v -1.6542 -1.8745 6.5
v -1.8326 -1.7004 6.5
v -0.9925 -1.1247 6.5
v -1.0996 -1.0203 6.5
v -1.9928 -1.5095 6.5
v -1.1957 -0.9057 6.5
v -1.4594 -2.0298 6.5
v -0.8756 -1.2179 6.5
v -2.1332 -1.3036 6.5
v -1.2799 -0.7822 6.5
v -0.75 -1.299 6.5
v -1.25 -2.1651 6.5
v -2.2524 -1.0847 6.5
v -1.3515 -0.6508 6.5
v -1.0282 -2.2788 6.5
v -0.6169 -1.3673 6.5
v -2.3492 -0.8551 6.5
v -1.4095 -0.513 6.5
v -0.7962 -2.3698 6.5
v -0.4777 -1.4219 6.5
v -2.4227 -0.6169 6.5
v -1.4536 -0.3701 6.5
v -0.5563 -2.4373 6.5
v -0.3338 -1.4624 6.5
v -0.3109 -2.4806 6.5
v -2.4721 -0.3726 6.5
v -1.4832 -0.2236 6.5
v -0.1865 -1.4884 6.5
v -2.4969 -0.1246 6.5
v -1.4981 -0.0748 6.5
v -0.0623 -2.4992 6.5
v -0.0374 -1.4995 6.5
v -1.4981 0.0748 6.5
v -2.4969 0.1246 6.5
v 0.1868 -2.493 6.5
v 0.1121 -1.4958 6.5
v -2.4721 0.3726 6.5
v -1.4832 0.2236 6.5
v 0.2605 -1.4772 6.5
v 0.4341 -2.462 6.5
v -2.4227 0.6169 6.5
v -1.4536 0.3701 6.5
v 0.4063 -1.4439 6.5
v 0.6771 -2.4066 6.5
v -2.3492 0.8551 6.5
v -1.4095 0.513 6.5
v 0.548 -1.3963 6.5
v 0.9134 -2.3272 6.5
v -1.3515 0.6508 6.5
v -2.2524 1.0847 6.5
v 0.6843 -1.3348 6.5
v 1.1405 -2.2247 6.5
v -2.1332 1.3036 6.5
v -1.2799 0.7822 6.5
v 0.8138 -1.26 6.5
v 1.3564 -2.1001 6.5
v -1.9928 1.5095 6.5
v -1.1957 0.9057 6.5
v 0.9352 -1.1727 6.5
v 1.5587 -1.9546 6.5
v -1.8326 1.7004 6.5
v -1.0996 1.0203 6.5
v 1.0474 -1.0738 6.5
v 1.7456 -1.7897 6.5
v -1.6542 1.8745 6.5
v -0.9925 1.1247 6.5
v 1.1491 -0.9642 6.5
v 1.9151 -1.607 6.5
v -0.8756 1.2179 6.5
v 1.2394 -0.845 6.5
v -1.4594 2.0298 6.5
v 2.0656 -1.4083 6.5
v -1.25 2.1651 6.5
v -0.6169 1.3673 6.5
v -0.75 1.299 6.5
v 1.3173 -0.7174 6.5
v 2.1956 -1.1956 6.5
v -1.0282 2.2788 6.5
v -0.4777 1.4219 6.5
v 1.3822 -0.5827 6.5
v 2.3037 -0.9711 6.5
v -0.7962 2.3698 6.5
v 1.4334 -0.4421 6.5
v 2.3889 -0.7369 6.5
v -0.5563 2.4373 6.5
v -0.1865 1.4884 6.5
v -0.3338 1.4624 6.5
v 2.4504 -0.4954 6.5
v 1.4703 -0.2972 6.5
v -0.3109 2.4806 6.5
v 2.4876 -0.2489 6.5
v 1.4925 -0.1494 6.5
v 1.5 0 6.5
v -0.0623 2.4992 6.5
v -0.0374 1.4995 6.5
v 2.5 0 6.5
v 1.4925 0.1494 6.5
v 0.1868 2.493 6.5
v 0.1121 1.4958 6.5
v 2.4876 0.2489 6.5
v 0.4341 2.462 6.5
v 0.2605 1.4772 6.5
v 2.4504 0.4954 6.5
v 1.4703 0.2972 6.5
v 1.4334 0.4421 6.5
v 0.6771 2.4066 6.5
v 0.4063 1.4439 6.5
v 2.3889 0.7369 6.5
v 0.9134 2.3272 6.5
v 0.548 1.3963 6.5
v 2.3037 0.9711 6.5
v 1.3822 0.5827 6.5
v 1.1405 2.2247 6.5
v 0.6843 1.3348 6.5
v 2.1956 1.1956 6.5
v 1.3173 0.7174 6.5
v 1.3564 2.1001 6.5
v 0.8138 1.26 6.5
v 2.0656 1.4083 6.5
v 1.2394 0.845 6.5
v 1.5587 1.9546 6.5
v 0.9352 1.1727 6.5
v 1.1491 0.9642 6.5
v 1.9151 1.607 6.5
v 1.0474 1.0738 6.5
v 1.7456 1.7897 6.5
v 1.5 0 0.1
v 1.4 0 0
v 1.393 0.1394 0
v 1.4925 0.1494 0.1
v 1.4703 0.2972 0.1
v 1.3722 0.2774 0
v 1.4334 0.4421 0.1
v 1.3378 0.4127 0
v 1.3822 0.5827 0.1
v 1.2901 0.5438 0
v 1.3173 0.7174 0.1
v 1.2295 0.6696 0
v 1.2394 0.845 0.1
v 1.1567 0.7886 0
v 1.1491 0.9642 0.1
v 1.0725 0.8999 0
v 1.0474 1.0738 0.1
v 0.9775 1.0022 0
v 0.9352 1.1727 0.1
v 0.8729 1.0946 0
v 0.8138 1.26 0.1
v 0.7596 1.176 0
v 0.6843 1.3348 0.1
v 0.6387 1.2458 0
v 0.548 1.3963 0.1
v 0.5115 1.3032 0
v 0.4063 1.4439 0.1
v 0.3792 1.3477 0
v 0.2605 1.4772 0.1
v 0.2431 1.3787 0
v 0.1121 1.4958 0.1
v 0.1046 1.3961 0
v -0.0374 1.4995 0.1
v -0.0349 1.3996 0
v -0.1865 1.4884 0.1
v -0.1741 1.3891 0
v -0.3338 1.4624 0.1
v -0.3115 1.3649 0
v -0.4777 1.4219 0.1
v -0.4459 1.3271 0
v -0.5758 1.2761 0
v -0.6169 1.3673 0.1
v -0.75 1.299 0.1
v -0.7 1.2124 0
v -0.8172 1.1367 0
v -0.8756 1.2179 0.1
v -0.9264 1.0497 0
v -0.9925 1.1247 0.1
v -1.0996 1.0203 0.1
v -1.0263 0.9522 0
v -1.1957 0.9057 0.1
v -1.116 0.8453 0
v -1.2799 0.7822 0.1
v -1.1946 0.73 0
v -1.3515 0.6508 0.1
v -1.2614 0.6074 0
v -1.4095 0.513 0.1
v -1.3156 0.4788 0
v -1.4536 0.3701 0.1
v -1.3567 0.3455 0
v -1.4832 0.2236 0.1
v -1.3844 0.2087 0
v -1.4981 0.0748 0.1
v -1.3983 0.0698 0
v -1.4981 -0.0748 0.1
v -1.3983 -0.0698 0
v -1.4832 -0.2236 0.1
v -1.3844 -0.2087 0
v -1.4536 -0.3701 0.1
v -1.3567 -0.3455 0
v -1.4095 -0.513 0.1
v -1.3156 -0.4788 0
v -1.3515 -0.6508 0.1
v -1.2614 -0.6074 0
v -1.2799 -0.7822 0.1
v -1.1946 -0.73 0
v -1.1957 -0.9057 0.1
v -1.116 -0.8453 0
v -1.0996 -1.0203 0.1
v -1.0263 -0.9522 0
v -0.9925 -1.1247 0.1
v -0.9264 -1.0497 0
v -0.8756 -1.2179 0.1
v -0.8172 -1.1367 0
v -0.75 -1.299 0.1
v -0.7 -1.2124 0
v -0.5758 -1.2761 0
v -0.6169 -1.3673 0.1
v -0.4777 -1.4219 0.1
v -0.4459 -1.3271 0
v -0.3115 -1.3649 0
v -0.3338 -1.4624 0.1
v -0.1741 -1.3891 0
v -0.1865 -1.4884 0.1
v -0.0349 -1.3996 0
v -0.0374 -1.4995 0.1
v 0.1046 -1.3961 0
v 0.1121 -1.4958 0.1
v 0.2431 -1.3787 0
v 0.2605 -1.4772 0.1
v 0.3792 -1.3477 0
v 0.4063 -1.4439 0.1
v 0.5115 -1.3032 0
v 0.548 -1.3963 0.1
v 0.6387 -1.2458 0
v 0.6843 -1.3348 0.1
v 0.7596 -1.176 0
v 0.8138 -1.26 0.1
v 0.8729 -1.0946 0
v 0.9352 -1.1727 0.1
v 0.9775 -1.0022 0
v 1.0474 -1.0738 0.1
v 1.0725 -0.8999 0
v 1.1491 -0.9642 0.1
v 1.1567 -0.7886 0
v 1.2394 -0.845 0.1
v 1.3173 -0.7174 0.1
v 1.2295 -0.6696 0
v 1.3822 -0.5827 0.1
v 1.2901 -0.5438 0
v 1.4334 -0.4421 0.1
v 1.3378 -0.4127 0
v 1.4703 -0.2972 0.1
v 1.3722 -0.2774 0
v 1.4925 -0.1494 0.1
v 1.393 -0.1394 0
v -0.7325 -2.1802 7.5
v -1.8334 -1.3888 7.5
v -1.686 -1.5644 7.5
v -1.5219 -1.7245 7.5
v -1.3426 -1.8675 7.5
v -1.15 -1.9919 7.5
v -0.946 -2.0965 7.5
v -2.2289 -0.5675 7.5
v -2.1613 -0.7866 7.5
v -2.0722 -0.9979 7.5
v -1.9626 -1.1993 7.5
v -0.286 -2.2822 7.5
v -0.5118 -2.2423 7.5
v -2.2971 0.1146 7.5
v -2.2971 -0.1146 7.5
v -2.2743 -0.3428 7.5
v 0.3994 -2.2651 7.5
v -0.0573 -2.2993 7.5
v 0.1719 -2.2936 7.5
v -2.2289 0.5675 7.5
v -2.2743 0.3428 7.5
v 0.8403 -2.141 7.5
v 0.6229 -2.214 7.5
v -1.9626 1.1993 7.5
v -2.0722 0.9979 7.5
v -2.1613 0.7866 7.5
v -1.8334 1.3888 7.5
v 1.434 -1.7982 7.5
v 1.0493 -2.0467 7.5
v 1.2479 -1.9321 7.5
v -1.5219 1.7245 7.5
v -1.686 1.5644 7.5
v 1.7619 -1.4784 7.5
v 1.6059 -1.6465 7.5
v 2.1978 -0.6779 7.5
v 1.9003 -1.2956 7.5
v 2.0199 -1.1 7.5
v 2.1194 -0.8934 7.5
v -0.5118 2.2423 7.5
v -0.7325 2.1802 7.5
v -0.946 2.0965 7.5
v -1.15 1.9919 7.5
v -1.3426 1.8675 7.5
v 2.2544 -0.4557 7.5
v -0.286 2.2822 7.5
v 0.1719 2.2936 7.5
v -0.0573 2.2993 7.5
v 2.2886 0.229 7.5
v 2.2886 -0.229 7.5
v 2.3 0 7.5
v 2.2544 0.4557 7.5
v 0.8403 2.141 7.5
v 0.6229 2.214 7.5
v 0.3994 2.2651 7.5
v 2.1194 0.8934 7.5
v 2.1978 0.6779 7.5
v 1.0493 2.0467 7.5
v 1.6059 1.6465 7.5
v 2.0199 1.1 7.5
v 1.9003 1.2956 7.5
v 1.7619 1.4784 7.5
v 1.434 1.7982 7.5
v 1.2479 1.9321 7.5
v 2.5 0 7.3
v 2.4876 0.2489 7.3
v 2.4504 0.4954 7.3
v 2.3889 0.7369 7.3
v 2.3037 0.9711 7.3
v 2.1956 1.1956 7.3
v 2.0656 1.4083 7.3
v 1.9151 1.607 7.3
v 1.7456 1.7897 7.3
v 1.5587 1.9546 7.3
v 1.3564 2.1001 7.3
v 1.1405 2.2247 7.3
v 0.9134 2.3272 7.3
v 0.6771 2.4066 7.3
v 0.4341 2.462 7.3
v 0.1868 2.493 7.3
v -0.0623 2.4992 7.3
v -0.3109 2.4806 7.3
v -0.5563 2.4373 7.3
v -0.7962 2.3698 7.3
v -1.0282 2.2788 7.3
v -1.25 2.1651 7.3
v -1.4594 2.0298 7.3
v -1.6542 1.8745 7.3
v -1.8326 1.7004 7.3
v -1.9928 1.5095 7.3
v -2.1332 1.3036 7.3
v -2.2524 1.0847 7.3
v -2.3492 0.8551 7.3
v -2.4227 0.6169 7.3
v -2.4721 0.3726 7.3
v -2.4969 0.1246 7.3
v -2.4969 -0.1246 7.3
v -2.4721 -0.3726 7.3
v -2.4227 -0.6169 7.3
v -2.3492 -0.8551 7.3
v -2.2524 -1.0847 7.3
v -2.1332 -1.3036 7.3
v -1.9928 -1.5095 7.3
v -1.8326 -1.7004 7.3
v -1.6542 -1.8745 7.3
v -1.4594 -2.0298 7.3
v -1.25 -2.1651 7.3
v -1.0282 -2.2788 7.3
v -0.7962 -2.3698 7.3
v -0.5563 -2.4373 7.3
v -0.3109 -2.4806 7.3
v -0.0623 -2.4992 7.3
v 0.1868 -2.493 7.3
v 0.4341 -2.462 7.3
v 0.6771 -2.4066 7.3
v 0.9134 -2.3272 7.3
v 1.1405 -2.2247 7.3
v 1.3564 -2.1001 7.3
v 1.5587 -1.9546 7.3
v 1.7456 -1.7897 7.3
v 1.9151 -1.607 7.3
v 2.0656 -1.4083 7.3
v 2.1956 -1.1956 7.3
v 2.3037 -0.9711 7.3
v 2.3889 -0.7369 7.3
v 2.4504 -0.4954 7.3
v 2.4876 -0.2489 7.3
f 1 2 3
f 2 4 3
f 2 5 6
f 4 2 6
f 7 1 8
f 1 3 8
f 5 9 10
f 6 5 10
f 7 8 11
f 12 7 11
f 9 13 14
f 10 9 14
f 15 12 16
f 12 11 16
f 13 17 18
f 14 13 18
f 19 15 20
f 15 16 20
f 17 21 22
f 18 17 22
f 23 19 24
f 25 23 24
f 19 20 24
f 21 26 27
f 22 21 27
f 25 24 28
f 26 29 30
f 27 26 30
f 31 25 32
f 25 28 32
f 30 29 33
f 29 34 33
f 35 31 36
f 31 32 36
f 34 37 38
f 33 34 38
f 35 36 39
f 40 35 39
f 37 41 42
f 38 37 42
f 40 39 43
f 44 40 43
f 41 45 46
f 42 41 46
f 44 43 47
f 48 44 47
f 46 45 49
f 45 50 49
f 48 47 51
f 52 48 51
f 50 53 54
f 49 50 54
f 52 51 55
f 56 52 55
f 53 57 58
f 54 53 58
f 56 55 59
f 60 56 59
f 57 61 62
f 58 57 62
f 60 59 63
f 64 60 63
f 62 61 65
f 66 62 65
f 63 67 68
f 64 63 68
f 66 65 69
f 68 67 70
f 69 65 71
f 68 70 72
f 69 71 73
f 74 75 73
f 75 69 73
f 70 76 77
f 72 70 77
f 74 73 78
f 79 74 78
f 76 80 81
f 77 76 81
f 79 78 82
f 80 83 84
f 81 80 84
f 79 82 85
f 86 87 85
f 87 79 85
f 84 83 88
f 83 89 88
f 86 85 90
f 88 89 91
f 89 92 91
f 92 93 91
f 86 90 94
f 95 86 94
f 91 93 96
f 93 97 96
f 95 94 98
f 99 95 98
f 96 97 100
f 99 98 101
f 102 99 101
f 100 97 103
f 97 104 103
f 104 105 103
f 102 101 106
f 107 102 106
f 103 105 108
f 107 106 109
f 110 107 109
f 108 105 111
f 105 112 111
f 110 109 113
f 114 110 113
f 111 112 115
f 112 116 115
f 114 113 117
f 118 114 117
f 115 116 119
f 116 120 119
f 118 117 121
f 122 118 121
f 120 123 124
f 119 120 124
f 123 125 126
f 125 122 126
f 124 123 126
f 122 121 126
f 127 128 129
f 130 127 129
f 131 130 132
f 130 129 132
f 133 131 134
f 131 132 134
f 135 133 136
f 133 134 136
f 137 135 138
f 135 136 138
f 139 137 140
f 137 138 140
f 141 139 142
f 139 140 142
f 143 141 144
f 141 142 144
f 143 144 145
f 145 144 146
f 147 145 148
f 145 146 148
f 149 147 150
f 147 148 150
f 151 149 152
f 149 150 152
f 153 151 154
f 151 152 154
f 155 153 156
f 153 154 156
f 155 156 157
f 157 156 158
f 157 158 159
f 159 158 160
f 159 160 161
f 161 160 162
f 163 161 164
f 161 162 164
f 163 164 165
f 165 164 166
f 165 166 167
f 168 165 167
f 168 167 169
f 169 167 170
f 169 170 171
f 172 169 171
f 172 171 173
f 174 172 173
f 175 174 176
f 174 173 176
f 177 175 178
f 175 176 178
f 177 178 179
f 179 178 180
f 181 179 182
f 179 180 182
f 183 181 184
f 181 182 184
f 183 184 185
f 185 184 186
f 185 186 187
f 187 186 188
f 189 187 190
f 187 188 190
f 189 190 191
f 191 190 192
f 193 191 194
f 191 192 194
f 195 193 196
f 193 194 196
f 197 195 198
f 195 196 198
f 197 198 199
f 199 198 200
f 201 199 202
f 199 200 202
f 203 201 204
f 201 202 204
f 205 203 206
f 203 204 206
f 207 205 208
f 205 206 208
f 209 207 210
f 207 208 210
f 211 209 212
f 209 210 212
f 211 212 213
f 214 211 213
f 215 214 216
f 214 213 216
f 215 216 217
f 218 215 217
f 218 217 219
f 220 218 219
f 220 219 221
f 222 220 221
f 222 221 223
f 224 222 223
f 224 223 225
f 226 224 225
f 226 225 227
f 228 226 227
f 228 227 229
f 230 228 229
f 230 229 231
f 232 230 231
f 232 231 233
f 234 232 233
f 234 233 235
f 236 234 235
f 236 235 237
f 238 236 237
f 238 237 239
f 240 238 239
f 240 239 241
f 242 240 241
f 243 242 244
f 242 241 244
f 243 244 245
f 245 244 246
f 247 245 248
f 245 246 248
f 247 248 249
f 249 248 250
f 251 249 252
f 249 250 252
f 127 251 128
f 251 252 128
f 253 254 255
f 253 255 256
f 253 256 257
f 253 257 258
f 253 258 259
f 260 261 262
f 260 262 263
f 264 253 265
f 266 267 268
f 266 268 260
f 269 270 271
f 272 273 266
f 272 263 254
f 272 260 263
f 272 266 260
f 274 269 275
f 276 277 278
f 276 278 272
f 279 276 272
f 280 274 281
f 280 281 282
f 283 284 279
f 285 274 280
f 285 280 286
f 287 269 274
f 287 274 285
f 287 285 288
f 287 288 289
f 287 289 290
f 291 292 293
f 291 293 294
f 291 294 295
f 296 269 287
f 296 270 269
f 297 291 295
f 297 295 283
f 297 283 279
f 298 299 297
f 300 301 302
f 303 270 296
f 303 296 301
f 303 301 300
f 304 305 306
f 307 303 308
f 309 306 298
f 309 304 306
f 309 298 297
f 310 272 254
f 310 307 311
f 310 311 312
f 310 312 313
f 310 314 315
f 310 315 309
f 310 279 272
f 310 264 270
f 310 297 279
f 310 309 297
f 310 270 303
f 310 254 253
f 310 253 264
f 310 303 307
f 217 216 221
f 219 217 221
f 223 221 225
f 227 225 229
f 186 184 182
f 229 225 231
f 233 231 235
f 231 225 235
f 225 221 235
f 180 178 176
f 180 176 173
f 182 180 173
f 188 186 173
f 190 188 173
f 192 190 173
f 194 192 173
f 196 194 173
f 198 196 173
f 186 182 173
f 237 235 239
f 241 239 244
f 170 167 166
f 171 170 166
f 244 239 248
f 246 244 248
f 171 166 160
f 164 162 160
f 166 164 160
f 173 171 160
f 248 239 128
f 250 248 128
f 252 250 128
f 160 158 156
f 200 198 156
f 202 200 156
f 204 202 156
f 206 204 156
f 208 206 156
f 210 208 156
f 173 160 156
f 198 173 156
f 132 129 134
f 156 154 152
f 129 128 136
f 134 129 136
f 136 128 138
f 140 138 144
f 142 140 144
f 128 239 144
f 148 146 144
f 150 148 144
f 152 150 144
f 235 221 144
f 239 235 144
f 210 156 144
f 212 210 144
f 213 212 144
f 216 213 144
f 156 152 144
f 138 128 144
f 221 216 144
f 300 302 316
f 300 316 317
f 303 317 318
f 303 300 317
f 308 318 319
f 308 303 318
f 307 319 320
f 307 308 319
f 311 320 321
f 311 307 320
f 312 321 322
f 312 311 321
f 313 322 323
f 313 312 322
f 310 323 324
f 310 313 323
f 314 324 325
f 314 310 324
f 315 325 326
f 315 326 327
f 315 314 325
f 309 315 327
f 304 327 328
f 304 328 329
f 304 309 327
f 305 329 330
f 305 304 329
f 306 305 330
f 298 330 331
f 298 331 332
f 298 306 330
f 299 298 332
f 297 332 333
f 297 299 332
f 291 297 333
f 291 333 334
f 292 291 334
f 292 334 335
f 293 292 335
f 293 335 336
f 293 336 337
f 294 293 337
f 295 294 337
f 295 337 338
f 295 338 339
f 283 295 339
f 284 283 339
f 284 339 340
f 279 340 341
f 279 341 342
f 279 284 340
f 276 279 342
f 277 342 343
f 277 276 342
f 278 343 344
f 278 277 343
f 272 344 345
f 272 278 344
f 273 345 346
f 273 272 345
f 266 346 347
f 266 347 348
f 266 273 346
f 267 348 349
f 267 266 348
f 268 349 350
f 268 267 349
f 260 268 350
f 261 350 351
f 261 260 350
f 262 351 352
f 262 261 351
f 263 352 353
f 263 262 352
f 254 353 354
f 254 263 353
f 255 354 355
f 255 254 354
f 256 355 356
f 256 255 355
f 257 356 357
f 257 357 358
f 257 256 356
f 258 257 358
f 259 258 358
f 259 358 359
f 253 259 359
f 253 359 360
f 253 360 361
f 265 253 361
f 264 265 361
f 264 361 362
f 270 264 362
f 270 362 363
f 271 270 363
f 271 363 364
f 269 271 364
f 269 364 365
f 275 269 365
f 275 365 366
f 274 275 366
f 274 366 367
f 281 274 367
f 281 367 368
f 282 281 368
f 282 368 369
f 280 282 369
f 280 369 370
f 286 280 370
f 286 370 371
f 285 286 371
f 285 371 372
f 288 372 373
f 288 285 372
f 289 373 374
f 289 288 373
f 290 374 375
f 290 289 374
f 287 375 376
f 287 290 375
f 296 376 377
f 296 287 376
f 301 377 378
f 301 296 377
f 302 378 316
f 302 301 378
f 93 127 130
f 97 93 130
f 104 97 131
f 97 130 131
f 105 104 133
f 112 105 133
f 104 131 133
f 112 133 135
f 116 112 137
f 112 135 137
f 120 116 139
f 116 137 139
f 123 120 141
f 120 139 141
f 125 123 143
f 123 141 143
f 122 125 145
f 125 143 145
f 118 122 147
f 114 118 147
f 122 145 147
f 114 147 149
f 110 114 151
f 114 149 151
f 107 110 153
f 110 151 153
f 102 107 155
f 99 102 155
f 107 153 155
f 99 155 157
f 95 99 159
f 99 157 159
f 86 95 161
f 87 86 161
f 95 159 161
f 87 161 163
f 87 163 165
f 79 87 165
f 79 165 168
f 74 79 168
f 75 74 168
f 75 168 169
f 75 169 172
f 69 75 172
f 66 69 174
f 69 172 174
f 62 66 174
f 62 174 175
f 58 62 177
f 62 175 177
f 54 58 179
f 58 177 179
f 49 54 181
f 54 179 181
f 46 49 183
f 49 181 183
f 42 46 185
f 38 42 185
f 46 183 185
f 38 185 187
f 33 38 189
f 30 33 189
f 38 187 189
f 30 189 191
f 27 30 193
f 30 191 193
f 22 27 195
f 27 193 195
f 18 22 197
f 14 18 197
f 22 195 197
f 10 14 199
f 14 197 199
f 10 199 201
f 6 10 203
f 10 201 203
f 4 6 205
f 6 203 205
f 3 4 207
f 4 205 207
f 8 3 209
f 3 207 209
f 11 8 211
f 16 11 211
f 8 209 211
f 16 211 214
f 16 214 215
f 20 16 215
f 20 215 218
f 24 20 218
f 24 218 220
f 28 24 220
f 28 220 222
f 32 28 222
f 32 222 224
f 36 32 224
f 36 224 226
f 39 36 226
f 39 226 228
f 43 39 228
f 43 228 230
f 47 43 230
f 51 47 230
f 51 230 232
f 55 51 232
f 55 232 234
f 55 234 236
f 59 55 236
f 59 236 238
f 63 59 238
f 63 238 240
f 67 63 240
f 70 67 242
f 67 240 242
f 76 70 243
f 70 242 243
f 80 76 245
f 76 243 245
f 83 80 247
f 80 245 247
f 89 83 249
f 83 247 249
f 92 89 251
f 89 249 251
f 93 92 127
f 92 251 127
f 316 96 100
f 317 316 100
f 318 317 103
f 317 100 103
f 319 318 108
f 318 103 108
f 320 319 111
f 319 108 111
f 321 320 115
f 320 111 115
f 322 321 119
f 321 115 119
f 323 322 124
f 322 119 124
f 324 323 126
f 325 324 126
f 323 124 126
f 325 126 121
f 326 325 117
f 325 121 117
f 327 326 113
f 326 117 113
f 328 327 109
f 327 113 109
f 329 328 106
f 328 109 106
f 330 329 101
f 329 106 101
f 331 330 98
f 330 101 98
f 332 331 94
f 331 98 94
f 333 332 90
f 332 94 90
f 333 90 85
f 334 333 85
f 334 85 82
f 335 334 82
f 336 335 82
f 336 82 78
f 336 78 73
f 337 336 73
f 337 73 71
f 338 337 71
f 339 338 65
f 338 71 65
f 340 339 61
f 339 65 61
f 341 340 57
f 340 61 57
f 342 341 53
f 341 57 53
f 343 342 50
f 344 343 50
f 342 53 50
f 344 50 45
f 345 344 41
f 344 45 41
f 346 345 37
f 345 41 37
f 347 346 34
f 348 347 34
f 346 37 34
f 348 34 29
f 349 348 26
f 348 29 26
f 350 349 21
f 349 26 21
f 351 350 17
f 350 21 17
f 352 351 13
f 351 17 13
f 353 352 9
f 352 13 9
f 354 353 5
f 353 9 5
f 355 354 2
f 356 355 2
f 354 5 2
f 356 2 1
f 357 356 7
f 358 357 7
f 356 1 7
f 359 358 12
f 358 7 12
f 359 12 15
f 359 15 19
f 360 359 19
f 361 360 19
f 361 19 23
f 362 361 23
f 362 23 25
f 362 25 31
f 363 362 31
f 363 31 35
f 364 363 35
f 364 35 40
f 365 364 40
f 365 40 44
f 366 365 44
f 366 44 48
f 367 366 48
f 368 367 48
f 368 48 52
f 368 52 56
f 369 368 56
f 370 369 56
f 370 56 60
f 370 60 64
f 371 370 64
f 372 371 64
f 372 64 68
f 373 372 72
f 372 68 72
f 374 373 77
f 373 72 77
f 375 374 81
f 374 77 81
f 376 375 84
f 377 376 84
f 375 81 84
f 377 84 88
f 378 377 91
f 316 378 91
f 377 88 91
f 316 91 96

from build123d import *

# Parameters (mm, degrees)
SKETCH1_R           = 1.5
BOSS_EXTRUDE1_DEPTH = 6.5
CHAMFER1_SIZE       = 0.1
SKETCH2_R           = 2.5
BOSS_EXTRUDE2_DEPTH = 1
CHAMFER2_SIZE       = 0.2


with BuildPart() as part:
    # Sketch1 → Boss-Extrude1 (new body)
    with BuildSketch(Plane.XY):
        Circle(SKETCH1_R)
    extrude(amount=BOSS_EXTRUDE1_DEPTH)

    # Chamfer1
    chamfer1_edges = [part.edges().sort_by_distance(p)[0] for p in [
        (-1.5, 0, 0),
    ]]
    chamfer(chamfer1_edges, length=CHAMFER1_SIZE)

    # Sketch2 → Boss-Extrude2 (add)
    with BuildSketch(Plane.XY.offset(6.5)):
        Circle(SKETCH2_R)
    extrude(amount=BOSS_EXTRUDE2_DEPTH)

    # Chamfer2
    chamfer2_edges = [part.edges().sort_by_distance(p)[0] for p in [
        (-2.5, 0, 7.5),
    ]]
    chamfer(chamfer2_edges, length=CHAMFER2_SIZE)


solid = part.part
